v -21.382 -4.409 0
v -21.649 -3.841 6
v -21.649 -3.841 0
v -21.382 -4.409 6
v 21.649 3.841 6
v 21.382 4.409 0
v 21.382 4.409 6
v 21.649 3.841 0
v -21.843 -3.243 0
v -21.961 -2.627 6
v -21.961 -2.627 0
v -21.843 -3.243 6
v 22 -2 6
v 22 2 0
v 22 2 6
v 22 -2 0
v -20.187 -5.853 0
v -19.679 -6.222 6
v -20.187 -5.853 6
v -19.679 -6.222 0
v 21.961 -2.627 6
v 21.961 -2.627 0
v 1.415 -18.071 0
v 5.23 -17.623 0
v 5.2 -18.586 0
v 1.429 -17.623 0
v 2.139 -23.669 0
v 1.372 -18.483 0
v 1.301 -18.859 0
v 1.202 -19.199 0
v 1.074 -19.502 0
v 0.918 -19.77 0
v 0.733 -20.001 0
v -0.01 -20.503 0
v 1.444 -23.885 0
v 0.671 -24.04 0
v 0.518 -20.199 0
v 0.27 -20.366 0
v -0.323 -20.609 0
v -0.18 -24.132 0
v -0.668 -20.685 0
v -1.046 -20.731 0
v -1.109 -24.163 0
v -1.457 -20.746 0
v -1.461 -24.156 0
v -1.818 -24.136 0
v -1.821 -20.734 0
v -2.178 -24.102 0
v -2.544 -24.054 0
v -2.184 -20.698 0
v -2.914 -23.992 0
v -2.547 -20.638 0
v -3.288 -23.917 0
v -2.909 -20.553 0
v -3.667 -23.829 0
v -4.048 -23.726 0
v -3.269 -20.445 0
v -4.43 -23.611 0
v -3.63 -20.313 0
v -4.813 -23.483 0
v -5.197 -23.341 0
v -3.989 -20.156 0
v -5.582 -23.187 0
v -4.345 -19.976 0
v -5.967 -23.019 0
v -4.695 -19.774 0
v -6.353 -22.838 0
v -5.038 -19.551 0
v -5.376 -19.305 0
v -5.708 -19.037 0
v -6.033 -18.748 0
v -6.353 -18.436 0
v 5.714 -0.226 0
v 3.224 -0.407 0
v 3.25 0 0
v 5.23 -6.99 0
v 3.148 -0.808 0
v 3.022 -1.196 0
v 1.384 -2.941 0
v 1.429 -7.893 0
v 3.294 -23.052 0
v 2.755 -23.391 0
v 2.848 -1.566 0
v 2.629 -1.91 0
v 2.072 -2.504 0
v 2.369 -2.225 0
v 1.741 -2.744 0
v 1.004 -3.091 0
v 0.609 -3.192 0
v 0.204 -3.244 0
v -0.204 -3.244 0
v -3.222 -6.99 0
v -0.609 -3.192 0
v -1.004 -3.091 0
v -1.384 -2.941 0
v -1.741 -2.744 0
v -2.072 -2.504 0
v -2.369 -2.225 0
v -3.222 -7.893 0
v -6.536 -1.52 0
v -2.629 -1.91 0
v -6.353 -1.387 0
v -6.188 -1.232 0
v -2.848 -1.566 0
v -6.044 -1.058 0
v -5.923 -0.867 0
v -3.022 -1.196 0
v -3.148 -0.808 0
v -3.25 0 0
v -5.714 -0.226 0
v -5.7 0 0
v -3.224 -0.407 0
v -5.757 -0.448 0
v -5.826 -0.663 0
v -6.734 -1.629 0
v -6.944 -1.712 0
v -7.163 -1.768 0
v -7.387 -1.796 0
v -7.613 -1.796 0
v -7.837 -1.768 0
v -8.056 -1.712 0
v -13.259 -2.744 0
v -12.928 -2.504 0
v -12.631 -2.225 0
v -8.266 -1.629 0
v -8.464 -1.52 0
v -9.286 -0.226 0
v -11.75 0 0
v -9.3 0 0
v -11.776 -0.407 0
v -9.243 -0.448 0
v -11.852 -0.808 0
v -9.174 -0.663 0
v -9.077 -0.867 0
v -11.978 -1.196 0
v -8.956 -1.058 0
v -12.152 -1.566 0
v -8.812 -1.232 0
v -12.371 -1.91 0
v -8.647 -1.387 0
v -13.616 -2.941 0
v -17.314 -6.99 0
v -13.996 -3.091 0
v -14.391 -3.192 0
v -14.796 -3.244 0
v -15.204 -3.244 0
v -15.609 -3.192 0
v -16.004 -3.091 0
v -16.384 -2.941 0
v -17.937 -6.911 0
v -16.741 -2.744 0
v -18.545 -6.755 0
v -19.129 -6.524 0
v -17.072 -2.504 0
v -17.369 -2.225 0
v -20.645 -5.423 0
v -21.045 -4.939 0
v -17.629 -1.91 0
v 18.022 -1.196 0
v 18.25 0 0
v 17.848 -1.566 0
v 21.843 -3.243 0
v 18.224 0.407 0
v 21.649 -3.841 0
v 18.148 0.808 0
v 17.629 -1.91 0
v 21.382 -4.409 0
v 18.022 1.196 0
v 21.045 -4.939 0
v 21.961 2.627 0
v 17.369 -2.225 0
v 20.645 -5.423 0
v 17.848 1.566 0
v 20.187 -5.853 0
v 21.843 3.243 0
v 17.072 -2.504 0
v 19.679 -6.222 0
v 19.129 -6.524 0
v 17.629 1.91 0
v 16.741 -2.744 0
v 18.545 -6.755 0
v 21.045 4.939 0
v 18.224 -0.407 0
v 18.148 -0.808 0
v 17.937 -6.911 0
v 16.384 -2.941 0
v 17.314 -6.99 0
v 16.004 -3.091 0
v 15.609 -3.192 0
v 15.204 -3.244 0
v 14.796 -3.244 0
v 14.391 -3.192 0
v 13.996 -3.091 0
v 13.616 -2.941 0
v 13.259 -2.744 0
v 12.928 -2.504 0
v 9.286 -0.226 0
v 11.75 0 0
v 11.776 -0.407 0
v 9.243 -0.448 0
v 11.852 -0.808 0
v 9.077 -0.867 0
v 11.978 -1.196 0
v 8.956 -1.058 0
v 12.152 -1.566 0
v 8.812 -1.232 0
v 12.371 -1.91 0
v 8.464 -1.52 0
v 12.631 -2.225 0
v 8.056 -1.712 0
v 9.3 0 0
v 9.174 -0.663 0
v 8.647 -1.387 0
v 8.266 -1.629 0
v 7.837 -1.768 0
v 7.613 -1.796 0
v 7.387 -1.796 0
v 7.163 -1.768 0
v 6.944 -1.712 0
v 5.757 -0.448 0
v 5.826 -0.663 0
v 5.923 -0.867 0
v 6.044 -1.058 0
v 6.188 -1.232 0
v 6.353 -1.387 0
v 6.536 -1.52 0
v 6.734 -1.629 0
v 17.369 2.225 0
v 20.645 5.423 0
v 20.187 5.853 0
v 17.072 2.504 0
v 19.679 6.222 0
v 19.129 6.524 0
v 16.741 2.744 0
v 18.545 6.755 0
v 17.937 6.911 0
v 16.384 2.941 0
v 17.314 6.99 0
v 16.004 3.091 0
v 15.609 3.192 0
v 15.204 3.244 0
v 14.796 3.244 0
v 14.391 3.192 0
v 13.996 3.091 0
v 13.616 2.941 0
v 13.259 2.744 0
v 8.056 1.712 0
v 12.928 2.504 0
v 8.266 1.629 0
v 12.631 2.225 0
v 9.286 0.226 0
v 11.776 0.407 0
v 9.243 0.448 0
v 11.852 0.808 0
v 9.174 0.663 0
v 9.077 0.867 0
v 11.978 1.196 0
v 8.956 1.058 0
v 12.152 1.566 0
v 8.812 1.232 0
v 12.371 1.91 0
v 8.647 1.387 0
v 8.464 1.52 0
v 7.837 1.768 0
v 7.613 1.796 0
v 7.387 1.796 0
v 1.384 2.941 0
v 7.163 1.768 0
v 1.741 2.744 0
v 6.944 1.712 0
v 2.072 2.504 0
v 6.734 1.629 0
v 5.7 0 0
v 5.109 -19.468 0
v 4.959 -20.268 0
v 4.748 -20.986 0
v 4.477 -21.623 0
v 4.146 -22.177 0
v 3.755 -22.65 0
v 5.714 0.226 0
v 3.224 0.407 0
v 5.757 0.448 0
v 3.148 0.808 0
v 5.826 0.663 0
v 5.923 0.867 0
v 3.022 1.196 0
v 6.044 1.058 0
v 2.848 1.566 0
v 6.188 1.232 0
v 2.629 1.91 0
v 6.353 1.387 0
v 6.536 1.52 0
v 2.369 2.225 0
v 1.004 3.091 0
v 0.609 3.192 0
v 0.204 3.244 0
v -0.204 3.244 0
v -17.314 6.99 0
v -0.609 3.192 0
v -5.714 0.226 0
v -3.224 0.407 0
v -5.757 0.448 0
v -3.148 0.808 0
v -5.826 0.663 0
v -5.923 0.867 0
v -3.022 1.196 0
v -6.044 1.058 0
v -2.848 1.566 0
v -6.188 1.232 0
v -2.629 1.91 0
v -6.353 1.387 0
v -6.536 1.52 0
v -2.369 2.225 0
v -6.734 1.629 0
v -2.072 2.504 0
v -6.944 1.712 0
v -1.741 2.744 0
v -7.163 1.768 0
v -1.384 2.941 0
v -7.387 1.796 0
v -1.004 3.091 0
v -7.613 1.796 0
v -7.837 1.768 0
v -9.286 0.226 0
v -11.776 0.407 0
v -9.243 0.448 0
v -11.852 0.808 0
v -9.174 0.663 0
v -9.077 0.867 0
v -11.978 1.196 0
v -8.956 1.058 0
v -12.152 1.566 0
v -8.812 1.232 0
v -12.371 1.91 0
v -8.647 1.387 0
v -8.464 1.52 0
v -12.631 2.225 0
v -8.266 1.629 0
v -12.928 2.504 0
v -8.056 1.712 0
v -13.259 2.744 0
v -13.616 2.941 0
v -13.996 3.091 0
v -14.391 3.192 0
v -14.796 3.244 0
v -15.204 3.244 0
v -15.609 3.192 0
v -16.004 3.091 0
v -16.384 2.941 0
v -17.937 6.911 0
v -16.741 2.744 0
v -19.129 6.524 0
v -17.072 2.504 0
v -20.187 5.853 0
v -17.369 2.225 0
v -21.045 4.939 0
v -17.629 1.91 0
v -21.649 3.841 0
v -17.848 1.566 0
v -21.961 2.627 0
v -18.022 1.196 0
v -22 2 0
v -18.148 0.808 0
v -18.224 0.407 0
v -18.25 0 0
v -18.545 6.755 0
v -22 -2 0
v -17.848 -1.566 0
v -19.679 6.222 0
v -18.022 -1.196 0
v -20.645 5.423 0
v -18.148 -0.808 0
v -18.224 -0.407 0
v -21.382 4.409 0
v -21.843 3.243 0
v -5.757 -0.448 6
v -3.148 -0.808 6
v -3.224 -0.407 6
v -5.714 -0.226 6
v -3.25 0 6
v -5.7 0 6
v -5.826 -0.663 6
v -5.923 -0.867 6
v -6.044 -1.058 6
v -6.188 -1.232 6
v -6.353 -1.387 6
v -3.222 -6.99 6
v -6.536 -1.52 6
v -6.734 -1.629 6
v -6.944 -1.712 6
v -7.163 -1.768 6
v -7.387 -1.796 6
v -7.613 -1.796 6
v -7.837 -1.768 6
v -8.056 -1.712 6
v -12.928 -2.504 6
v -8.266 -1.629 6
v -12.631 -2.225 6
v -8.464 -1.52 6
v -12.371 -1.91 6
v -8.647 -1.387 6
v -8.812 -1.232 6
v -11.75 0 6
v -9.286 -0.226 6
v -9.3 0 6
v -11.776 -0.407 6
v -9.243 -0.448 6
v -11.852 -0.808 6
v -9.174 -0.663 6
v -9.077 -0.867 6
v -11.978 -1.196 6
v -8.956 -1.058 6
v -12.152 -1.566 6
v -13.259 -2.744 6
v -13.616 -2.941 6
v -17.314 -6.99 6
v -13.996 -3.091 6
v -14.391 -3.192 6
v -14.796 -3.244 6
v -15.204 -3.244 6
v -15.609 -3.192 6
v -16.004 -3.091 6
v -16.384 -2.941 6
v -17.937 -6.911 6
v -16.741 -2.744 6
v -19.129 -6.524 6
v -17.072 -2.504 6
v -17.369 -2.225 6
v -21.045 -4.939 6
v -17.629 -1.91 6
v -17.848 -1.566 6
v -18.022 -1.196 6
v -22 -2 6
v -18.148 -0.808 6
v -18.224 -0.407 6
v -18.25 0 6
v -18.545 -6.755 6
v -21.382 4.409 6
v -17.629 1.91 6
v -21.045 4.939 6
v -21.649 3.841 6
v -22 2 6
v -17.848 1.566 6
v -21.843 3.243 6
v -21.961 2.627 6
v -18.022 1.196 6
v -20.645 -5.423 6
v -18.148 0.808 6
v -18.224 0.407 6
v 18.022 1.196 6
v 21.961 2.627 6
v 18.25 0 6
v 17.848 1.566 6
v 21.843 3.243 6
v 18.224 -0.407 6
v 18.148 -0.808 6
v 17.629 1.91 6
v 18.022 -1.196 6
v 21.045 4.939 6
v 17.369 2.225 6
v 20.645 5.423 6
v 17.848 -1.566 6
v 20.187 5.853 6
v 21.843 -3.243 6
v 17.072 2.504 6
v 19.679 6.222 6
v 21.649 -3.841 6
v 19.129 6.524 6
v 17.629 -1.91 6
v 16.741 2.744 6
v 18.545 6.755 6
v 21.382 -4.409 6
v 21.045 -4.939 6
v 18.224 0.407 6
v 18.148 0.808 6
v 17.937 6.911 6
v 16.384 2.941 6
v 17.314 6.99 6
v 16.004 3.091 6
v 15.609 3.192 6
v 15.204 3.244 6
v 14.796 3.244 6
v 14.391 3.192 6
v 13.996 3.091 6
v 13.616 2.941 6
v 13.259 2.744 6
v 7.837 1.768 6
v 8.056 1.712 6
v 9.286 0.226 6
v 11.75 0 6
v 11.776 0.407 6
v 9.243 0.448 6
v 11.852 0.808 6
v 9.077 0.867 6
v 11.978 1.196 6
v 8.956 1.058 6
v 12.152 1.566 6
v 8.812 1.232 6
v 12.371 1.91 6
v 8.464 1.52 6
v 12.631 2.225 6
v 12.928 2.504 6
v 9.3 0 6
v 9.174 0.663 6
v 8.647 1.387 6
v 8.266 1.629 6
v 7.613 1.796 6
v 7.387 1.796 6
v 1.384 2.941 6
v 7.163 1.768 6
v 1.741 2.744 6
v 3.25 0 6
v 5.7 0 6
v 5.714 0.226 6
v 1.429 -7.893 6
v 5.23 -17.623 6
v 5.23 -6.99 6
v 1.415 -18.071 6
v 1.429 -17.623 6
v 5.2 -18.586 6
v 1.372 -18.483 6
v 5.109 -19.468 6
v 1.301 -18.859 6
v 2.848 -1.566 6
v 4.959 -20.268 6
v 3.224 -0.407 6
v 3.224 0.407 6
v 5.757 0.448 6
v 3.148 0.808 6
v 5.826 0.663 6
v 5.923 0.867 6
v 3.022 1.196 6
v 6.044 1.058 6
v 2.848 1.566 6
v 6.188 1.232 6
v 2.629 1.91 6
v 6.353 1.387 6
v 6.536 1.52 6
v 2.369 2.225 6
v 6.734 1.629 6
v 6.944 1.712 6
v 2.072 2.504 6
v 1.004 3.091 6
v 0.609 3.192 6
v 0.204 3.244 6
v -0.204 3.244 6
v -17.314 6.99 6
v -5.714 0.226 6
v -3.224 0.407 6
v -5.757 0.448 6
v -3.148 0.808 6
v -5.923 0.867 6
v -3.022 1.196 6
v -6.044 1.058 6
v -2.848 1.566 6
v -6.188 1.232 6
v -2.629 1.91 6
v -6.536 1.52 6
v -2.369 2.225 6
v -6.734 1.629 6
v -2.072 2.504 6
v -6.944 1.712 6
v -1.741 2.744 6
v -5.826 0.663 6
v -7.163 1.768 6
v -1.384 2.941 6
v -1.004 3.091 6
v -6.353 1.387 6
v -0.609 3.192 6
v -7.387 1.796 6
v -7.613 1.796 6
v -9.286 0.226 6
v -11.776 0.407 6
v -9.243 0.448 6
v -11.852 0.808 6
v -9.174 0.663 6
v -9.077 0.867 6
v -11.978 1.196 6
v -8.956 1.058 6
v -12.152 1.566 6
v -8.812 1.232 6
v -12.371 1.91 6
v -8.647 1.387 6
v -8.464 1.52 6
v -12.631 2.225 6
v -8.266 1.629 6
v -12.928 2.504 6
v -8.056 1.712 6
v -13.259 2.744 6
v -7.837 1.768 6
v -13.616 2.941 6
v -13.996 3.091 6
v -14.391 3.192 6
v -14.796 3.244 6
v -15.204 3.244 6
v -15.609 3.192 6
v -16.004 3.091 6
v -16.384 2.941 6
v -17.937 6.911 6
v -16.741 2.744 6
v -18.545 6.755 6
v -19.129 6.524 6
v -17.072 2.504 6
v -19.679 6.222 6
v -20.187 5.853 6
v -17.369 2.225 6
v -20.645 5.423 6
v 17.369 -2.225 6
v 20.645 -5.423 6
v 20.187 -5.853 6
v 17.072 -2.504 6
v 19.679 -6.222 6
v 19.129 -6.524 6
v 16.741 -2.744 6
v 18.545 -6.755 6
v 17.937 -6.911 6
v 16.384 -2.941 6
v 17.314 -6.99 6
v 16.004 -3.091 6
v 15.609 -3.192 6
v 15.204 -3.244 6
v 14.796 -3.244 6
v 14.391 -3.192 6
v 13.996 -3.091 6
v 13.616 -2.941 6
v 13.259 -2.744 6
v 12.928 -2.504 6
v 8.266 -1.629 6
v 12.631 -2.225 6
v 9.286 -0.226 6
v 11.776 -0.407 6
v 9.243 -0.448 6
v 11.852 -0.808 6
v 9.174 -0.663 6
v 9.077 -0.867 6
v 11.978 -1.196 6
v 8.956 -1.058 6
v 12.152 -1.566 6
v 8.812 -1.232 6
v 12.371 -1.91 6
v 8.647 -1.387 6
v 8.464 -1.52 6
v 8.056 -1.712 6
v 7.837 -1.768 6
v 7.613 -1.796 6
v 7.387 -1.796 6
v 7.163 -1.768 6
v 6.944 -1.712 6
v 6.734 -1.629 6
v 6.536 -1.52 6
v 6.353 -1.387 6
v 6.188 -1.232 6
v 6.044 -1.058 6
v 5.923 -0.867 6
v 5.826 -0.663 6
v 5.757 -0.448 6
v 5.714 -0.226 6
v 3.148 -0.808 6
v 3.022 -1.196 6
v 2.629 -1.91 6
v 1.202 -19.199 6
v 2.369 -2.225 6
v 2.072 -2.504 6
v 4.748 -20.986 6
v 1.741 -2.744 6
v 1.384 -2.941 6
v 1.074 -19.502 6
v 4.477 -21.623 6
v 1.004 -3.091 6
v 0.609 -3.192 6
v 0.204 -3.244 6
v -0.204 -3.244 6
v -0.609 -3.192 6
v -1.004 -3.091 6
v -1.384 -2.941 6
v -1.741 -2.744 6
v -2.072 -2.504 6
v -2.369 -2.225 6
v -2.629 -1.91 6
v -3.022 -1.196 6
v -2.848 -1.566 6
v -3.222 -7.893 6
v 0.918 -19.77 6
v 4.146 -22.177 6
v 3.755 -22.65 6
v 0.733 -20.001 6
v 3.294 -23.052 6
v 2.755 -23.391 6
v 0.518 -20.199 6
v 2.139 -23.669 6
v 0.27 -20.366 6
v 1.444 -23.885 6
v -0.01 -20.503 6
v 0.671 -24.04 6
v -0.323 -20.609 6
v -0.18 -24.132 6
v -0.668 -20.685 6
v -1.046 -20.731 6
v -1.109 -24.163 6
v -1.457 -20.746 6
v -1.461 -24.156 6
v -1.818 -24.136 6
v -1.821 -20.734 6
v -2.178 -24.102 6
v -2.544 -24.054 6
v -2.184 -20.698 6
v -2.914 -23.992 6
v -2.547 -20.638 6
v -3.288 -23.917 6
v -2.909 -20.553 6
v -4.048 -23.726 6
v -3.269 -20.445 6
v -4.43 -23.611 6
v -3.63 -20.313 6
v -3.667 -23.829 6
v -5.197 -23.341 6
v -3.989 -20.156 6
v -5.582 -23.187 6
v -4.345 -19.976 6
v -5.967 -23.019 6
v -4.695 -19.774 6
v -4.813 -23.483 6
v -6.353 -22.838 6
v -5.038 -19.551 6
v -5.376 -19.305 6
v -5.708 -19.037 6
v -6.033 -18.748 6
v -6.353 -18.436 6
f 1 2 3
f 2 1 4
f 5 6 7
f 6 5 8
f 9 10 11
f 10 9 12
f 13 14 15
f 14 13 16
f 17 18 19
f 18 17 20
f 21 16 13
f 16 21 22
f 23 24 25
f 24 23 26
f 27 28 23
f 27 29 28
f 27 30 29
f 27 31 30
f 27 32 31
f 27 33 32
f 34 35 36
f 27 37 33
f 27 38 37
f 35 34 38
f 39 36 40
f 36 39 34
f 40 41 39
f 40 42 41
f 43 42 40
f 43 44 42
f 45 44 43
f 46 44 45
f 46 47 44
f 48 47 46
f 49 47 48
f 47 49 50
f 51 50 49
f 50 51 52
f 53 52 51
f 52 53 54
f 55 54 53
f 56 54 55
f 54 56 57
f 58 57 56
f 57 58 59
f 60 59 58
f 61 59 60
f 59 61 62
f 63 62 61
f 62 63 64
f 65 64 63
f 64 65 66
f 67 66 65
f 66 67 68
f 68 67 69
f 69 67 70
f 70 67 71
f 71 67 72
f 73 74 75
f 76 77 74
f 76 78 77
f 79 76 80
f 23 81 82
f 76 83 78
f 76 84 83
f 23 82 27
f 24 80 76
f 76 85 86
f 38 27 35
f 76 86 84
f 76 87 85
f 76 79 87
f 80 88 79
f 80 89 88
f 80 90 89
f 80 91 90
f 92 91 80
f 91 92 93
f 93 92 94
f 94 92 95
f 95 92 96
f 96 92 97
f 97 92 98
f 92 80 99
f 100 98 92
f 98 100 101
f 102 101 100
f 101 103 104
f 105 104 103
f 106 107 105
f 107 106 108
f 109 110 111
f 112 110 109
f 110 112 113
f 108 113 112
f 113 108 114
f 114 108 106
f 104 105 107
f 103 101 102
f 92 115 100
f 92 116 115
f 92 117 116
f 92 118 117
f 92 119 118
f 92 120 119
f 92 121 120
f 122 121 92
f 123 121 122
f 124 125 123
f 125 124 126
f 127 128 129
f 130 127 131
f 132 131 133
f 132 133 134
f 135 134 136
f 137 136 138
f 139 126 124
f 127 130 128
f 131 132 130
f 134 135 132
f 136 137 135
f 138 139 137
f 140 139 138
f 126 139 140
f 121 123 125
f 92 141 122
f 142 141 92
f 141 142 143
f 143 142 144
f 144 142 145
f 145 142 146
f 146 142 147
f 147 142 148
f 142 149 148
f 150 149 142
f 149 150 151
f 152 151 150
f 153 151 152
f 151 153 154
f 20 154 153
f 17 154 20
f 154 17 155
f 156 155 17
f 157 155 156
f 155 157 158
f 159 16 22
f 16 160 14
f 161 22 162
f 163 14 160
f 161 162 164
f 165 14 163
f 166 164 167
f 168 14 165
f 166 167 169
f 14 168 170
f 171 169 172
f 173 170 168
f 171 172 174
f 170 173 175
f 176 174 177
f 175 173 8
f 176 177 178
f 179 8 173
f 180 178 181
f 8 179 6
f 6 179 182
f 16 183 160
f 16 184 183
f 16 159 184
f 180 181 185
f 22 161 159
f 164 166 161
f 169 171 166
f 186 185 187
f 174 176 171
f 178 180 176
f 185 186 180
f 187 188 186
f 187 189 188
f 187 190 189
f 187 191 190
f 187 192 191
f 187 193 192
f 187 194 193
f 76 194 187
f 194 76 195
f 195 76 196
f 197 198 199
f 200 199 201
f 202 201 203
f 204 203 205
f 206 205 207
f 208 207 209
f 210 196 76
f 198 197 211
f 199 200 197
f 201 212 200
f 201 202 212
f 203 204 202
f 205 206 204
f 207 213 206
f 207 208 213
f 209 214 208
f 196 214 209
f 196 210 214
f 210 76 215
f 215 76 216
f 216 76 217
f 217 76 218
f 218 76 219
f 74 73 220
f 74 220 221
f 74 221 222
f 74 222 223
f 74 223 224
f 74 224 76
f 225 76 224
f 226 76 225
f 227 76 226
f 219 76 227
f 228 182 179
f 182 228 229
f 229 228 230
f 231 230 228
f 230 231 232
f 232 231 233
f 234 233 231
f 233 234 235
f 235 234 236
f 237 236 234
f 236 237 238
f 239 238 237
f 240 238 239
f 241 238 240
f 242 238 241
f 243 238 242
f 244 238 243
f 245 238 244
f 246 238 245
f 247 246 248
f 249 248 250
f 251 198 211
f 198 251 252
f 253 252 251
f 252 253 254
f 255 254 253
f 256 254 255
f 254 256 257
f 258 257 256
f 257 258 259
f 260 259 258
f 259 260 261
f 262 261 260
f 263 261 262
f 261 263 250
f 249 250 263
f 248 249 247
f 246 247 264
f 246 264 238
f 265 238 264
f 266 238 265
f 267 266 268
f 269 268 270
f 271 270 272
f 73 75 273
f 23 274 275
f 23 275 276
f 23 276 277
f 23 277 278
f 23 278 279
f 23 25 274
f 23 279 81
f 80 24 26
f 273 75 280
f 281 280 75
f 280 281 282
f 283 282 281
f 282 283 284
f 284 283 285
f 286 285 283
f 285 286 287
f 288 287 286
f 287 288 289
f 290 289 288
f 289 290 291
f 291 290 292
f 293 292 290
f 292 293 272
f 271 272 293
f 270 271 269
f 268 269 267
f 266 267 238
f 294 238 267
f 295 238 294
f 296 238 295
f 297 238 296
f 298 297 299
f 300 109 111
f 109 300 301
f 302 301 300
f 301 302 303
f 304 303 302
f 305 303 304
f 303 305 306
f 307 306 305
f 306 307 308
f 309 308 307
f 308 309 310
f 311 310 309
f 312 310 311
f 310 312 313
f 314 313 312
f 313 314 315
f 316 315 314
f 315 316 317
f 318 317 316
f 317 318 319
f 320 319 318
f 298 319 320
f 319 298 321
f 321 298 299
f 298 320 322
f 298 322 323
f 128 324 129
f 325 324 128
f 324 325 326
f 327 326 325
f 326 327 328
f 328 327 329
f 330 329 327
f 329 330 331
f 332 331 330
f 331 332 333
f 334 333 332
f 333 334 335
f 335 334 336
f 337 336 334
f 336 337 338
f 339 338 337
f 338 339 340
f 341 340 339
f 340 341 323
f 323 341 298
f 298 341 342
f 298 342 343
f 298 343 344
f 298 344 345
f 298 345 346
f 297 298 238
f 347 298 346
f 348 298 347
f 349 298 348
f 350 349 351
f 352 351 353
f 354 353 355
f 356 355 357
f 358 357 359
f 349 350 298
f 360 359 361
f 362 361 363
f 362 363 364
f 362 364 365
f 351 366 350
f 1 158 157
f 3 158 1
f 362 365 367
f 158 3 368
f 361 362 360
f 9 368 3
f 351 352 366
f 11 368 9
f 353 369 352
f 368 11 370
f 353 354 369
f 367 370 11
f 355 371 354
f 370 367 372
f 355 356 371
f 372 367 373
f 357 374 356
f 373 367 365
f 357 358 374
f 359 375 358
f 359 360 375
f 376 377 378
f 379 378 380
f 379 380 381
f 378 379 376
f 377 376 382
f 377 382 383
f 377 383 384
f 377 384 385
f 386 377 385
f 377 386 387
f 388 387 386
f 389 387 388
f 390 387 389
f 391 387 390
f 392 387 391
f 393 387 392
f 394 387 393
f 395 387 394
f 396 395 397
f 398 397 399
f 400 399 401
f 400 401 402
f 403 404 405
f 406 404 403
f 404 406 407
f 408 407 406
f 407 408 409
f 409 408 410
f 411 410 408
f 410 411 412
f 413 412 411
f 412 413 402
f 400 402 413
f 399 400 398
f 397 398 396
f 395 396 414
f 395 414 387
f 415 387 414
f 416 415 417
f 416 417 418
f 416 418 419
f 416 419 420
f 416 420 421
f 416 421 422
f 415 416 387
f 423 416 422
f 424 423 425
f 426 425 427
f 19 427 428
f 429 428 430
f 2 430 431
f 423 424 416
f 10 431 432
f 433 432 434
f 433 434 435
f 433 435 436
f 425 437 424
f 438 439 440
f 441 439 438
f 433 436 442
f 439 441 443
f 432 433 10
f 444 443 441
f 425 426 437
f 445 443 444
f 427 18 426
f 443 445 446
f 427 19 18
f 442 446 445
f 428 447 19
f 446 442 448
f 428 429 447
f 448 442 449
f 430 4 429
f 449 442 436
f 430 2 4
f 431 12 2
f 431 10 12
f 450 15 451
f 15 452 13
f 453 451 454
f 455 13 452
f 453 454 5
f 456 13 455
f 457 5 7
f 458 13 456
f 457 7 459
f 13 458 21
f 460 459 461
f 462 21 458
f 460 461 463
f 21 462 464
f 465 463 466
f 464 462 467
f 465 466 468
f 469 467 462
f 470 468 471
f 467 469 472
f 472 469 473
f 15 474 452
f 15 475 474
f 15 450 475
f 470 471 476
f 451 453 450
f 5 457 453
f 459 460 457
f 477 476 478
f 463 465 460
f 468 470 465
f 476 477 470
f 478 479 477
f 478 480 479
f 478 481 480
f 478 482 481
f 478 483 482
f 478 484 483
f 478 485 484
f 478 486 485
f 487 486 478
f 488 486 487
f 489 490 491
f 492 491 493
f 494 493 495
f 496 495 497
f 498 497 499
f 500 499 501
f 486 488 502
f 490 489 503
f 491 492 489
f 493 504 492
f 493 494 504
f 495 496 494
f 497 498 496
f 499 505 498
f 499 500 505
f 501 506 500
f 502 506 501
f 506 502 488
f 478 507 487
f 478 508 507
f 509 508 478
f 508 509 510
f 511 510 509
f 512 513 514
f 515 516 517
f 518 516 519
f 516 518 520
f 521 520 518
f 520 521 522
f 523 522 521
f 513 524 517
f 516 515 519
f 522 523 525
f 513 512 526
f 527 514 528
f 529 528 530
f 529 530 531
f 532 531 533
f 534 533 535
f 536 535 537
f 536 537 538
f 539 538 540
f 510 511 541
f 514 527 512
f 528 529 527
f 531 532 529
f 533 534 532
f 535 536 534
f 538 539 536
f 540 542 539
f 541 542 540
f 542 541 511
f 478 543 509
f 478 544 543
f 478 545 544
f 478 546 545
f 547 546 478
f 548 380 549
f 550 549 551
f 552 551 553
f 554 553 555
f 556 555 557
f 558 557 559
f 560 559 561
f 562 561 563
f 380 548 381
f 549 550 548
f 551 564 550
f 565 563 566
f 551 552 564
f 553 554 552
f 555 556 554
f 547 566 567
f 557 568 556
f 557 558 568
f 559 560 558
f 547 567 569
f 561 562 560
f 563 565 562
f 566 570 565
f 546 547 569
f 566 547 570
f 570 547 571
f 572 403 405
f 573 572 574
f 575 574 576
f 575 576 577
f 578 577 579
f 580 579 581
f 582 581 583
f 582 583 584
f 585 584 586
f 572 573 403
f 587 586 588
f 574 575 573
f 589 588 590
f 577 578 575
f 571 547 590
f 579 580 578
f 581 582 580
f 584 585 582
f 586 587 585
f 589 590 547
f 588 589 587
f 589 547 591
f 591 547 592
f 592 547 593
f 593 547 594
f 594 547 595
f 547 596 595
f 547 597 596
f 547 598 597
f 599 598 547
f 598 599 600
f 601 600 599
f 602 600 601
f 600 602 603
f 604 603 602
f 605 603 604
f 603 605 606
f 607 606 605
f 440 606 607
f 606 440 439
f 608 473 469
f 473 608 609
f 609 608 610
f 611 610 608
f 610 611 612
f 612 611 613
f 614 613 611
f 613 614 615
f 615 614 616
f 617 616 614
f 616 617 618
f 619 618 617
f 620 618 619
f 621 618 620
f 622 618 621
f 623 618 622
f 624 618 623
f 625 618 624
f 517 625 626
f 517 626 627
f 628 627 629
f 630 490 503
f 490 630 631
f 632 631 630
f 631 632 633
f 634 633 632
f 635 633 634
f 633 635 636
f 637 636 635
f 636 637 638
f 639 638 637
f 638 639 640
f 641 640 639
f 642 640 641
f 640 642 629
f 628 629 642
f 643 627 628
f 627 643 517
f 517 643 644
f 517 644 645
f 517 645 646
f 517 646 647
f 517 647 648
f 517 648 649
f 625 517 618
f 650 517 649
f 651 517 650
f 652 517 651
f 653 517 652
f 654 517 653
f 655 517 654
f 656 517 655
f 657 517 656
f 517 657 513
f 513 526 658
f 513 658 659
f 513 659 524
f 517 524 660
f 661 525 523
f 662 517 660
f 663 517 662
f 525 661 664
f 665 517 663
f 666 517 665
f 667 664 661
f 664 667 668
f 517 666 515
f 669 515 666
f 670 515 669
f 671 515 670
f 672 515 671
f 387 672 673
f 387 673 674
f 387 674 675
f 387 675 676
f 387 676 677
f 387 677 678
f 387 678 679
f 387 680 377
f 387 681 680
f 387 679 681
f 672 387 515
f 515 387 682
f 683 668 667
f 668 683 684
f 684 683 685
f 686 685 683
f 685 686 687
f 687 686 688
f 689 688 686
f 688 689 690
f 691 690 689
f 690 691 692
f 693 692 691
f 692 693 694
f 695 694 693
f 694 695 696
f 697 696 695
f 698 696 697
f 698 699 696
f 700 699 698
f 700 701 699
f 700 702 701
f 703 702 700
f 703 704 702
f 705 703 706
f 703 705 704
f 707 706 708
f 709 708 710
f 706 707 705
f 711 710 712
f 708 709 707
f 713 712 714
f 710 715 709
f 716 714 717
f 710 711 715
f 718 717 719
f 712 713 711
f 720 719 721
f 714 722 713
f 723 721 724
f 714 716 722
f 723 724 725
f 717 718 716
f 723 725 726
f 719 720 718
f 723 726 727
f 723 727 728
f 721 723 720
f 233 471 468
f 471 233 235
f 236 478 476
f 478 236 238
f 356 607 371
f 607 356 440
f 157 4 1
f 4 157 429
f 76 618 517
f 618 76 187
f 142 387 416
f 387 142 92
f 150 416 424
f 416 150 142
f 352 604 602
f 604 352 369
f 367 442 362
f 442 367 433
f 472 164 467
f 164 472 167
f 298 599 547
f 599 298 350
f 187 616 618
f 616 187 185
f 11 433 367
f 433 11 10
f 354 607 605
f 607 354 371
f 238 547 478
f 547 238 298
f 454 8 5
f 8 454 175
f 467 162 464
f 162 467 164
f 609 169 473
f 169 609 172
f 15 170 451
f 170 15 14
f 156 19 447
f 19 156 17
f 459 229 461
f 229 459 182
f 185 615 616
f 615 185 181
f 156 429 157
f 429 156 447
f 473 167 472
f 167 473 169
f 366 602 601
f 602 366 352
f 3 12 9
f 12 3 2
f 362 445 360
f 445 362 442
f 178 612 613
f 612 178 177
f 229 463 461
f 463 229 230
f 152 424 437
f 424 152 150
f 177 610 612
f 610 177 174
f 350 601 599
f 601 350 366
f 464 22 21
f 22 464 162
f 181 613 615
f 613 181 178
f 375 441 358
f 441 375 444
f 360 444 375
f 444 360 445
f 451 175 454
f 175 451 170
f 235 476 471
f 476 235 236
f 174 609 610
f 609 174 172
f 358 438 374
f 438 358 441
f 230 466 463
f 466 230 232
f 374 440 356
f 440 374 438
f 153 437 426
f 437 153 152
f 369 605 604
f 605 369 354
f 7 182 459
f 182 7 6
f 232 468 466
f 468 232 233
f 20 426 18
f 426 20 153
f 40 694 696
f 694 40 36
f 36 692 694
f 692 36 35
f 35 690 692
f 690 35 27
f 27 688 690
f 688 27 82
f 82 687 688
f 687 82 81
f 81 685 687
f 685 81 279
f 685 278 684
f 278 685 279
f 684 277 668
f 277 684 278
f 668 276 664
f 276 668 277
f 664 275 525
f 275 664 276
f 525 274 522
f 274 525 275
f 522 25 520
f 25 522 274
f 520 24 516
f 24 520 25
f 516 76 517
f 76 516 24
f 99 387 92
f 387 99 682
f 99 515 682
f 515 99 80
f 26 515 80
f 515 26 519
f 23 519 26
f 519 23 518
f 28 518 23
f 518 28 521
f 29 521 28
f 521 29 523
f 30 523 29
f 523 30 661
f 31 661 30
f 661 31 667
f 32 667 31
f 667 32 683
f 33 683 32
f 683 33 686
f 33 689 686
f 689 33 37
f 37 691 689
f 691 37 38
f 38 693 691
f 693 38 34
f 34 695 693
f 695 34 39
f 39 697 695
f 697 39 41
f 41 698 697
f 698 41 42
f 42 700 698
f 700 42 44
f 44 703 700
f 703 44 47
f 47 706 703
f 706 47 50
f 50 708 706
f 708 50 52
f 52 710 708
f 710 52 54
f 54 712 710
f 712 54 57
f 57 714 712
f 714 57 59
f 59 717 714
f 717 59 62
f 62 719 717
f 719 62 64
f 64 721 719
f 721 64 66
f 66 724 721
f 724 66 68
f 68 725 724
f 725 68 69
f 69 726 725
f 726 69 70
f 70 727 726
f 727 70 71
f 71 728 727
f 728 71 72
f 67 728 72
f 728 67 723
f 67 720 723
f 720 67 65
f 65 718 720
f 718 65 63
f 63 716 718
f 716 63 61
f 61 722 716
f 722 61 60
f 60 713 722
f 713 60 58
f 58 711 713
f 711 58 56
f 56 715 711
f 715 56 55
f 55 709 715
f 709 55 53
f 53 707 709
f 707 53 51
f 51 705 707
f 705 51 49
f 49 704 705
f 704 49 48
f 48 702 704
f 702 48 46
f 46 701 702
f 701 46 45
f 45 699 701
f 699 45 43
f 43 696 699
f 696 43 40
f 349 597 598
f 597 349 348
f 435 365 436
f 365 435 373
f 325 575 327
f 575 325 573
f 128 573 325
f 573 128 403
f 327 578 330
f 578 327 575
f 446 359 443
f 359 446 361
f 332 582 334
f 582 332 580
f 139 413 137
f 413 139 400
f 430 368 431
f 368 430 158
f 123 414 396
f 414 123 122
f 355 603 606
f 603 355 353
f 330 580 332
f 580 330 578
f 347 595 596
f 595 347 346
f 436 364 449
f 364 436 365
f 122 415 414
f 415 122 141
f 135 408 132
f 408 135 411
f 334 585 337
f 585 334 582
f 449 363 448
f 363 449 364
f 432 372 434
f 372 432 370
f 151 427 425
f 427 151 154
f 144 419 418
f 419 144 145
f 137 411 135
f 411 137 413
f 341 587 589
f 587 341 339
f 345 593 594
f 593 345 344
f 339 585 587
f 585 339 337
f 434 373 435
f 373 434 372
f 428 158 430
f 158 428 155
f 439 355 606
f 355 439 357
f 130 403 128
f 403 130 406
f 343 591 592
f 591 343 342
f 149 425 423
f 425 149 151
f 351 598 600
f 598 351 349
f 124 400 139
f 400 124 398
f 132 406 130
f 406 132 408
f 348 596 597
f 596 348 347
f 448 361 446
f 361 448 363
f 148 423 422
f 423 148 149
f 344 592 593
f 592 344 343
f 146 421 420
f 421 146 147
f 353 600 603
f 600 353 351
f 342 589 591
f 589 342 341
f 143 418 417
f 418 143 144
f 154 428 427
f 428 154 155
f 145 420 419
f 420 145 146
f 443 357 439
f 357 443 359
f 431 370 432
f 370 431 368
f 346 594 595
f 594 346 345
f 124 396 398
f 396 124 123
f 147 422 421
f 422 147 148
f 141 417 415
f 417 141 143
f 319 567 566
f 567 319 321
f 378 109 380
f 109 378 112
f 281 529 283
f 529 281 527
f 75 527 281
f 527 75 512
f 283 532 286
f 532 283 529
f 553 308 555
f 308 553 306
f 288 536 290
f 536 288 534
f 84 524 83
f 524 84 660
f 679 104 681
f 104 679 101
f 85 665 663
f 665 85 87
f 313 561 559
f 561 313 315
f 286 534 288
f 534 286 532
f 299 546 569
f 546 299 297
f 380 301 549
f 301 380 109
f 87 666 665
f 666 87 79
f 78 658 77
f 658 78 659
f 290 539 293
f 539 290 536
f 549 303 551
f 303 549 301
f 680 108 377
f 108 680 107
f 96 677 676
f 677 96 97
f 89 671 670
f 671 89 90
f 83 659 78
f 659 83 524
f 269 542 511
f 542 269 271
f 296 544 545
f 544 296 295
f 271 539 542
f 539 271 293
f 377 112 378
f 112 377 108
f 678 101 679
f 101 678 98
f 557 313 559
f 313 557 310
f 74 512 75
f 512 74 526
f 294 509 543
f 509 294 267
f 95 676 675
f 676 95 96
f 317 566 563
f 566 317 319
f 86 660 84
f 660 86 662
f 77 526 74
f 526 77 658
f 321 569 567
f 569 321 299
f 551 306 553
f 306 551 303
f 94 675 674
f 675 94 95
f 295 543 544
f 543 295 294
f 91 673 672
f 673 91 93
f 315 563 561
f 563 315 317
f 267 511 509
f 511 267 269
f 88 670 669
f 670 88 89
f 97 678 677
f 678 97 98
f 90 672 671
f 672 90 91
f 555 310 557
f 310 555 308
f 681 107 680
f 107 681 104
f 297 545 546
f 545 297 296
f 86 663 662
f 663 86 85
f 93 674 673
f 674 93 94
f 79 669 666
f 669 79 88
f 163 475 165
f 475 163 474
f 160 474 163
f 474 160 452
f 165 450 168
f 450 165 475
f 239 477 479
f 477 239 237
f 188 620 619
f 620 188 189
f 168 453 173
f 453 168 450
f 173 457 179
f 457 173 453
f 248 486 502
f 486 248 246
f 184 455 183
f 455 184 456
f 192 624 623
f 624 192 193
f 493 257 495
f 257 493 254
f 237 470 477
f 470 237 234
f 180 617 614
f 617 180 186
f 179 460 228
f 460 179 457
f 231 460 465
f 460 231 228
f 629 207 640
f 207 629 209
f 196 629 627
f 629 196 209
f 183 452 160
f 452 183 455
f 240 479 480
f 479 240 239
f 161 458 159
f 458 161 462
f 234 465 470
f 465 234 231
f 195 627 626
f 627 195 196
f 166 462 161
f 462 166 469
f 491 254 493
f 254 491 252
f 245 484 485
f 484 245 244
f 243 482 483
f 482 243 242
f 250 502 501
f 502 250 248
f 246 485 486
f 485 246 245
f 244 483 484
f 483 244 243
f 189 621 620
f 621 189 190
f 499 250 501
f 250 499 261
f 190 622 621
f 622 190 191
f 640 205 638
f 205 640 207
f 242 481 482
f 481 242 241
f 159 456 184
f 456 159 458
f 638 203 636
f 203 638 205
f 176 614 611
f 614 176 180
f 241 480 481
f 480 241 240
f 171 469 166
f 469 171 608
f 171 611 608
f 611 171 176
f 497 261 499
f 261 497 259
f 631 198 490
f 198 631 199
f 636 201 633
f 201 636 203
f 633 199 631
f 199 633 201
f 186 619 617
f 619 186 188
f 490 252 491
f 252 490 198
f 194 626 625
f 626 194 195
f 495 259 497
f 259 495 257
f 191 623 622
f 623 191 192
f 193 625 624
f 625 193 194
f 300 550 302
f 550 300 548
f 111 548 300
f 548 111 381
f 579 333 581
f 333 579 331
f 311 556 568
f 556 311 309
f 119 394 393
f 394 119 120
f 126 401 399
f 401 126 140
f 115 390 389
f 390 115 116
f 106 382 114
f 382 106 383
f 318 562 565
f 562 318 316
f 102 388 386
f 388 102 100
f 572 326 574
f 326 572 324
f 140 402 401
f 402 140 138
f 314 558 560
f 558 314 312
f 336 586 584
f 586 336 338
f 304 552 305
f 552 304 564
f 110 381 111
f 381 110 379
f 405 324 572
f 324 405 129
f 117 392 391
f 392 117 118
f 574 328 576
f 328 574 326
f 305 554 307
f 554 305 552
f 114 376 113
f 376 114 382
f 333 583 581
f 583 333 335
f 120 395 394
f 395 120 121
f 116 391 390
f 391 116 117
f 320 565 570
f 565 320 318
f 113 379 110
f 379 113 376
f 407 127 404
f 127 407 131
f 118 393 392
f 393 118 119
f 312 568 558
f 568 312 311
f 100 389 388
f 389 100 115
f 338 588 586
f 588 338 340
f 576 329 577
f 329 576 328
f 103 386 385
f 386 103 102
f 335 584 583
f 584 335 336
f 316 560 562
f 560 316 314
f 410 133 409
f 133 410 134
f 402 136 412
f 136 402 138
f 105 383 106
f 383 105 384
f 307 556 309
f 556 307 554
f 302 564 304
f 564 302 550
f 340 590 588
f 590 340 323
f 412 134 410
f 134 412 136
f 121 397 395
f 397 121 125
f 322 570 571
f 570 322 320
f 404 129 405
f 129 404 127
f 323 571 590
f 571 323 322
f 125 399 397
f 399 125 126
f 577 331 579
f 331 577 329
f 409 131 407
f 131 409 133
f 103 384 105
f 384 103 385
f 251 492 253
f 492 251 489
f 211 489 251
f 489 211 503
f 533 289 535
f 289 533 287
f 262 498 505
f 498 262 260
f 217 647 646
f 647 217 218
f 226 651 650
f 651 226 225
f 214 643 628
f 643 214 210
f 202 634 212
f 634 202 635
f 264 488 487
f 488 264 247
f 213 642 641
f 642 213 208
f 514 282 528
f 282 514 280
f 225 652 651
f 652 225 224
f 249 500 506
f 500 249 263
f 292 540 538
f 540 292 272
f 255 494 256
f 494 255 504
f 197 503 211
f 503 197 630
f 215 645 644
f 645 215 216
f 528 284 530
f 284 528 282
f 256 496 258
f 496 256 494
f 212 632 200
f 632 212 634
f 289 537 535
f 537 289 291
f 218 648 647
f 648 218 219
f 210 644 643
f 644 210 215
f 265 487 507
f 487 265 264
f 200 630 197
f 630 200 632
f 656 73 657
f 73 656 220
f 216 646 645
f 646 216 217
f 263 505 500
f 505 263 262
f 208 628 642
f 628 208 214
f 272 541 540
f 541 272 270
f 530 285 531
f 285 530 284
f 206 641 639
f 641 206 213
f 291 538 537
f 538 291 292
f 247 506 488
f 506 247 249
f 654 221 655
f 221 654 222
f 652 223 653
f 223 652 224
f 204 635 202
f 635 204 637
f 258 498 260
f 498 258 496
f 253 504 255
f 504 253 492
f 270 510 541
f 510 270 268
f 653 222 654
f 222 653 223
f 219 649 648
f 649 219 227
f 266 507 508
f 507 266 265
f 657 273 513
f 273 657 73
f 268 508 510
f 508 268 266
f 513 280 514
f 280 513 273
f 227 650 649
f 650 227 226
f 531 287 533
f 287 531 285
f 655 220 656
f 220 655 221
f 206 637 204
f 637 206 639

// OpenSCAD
$fn = 50;


difference() {
	union() {
		hull() {
			translate(v = [-17.0000000000, 2.0000000000, 0]) {
				cylinder(h = 6, r = 5);
			}
			translate(v = [17.0000000000, 2.0000000000, 0]) {
				cylinder(h = 6, r = 5);
			}
			translate(v = [-17.0000000000, -2.0000000000, 0]) {
				cylinder(h = 6, r = 5);
			}
			translate(v = [17.0000000000, -2.0000000000, 0]) {
				cylinder(h = 6, r = 5);
			}
		}
		translate(v = [0, -5, 0]) {
			linear_extrude(height = 6) {
				text(font = "DejaVu Sans Mono:style=Bold", halign = "center", size = 19.0000000000, text = "J", valign = "top");
			}
		}
	}
	union() {
		translate(v = [-15.0000000000, 0.0000000000, 0]) {
			translate(v = [0, 0, -100]) {
				cylinder(h = 200, r = 3.2500000000);
			}
		}
		translate(v = [0, 0, -100]) {
			cylinder(h = 200, r = 3.2500000000);
		}
		translate(v = [15.0000000000, 0.0000000000, 0]) {
			translate(v = [0, 0, -100]) {
				cylinder(h = 200, r = 3.2500000000);
			}
		}
		translate(v = [-15.0000000000, 0.0000000000, 0]) {
			translate(v = [0, 0, -100]) {
				cylinder(h = 200, r = 1.8000000000);
			}
		}
		translate(v = [-7.5000000000, 0.0000000000, 0]) {
			translate(v = [0, 0, -100]) {
				cylinder(h = 200, r = 1.8000000000);
			}
		}
		translate(v = [0, 0, -100]) {
			cylinder(h = 200, r = 1.8000000000);
		}
		translate(v = [7.5000000000, 0.0000000000, 0]) {
			translate(v = [0, 0, -100]) {
				cylinder(h = 200, r = 1.8000000000);
			}
		}
		translate(v = [15.0000000000, 0.0000000000, 0]) {
			translate(v = [0, 0, -100]) {
				cylinder(h = 200, r = 1.8000000000);
			}
		}
	}
}
